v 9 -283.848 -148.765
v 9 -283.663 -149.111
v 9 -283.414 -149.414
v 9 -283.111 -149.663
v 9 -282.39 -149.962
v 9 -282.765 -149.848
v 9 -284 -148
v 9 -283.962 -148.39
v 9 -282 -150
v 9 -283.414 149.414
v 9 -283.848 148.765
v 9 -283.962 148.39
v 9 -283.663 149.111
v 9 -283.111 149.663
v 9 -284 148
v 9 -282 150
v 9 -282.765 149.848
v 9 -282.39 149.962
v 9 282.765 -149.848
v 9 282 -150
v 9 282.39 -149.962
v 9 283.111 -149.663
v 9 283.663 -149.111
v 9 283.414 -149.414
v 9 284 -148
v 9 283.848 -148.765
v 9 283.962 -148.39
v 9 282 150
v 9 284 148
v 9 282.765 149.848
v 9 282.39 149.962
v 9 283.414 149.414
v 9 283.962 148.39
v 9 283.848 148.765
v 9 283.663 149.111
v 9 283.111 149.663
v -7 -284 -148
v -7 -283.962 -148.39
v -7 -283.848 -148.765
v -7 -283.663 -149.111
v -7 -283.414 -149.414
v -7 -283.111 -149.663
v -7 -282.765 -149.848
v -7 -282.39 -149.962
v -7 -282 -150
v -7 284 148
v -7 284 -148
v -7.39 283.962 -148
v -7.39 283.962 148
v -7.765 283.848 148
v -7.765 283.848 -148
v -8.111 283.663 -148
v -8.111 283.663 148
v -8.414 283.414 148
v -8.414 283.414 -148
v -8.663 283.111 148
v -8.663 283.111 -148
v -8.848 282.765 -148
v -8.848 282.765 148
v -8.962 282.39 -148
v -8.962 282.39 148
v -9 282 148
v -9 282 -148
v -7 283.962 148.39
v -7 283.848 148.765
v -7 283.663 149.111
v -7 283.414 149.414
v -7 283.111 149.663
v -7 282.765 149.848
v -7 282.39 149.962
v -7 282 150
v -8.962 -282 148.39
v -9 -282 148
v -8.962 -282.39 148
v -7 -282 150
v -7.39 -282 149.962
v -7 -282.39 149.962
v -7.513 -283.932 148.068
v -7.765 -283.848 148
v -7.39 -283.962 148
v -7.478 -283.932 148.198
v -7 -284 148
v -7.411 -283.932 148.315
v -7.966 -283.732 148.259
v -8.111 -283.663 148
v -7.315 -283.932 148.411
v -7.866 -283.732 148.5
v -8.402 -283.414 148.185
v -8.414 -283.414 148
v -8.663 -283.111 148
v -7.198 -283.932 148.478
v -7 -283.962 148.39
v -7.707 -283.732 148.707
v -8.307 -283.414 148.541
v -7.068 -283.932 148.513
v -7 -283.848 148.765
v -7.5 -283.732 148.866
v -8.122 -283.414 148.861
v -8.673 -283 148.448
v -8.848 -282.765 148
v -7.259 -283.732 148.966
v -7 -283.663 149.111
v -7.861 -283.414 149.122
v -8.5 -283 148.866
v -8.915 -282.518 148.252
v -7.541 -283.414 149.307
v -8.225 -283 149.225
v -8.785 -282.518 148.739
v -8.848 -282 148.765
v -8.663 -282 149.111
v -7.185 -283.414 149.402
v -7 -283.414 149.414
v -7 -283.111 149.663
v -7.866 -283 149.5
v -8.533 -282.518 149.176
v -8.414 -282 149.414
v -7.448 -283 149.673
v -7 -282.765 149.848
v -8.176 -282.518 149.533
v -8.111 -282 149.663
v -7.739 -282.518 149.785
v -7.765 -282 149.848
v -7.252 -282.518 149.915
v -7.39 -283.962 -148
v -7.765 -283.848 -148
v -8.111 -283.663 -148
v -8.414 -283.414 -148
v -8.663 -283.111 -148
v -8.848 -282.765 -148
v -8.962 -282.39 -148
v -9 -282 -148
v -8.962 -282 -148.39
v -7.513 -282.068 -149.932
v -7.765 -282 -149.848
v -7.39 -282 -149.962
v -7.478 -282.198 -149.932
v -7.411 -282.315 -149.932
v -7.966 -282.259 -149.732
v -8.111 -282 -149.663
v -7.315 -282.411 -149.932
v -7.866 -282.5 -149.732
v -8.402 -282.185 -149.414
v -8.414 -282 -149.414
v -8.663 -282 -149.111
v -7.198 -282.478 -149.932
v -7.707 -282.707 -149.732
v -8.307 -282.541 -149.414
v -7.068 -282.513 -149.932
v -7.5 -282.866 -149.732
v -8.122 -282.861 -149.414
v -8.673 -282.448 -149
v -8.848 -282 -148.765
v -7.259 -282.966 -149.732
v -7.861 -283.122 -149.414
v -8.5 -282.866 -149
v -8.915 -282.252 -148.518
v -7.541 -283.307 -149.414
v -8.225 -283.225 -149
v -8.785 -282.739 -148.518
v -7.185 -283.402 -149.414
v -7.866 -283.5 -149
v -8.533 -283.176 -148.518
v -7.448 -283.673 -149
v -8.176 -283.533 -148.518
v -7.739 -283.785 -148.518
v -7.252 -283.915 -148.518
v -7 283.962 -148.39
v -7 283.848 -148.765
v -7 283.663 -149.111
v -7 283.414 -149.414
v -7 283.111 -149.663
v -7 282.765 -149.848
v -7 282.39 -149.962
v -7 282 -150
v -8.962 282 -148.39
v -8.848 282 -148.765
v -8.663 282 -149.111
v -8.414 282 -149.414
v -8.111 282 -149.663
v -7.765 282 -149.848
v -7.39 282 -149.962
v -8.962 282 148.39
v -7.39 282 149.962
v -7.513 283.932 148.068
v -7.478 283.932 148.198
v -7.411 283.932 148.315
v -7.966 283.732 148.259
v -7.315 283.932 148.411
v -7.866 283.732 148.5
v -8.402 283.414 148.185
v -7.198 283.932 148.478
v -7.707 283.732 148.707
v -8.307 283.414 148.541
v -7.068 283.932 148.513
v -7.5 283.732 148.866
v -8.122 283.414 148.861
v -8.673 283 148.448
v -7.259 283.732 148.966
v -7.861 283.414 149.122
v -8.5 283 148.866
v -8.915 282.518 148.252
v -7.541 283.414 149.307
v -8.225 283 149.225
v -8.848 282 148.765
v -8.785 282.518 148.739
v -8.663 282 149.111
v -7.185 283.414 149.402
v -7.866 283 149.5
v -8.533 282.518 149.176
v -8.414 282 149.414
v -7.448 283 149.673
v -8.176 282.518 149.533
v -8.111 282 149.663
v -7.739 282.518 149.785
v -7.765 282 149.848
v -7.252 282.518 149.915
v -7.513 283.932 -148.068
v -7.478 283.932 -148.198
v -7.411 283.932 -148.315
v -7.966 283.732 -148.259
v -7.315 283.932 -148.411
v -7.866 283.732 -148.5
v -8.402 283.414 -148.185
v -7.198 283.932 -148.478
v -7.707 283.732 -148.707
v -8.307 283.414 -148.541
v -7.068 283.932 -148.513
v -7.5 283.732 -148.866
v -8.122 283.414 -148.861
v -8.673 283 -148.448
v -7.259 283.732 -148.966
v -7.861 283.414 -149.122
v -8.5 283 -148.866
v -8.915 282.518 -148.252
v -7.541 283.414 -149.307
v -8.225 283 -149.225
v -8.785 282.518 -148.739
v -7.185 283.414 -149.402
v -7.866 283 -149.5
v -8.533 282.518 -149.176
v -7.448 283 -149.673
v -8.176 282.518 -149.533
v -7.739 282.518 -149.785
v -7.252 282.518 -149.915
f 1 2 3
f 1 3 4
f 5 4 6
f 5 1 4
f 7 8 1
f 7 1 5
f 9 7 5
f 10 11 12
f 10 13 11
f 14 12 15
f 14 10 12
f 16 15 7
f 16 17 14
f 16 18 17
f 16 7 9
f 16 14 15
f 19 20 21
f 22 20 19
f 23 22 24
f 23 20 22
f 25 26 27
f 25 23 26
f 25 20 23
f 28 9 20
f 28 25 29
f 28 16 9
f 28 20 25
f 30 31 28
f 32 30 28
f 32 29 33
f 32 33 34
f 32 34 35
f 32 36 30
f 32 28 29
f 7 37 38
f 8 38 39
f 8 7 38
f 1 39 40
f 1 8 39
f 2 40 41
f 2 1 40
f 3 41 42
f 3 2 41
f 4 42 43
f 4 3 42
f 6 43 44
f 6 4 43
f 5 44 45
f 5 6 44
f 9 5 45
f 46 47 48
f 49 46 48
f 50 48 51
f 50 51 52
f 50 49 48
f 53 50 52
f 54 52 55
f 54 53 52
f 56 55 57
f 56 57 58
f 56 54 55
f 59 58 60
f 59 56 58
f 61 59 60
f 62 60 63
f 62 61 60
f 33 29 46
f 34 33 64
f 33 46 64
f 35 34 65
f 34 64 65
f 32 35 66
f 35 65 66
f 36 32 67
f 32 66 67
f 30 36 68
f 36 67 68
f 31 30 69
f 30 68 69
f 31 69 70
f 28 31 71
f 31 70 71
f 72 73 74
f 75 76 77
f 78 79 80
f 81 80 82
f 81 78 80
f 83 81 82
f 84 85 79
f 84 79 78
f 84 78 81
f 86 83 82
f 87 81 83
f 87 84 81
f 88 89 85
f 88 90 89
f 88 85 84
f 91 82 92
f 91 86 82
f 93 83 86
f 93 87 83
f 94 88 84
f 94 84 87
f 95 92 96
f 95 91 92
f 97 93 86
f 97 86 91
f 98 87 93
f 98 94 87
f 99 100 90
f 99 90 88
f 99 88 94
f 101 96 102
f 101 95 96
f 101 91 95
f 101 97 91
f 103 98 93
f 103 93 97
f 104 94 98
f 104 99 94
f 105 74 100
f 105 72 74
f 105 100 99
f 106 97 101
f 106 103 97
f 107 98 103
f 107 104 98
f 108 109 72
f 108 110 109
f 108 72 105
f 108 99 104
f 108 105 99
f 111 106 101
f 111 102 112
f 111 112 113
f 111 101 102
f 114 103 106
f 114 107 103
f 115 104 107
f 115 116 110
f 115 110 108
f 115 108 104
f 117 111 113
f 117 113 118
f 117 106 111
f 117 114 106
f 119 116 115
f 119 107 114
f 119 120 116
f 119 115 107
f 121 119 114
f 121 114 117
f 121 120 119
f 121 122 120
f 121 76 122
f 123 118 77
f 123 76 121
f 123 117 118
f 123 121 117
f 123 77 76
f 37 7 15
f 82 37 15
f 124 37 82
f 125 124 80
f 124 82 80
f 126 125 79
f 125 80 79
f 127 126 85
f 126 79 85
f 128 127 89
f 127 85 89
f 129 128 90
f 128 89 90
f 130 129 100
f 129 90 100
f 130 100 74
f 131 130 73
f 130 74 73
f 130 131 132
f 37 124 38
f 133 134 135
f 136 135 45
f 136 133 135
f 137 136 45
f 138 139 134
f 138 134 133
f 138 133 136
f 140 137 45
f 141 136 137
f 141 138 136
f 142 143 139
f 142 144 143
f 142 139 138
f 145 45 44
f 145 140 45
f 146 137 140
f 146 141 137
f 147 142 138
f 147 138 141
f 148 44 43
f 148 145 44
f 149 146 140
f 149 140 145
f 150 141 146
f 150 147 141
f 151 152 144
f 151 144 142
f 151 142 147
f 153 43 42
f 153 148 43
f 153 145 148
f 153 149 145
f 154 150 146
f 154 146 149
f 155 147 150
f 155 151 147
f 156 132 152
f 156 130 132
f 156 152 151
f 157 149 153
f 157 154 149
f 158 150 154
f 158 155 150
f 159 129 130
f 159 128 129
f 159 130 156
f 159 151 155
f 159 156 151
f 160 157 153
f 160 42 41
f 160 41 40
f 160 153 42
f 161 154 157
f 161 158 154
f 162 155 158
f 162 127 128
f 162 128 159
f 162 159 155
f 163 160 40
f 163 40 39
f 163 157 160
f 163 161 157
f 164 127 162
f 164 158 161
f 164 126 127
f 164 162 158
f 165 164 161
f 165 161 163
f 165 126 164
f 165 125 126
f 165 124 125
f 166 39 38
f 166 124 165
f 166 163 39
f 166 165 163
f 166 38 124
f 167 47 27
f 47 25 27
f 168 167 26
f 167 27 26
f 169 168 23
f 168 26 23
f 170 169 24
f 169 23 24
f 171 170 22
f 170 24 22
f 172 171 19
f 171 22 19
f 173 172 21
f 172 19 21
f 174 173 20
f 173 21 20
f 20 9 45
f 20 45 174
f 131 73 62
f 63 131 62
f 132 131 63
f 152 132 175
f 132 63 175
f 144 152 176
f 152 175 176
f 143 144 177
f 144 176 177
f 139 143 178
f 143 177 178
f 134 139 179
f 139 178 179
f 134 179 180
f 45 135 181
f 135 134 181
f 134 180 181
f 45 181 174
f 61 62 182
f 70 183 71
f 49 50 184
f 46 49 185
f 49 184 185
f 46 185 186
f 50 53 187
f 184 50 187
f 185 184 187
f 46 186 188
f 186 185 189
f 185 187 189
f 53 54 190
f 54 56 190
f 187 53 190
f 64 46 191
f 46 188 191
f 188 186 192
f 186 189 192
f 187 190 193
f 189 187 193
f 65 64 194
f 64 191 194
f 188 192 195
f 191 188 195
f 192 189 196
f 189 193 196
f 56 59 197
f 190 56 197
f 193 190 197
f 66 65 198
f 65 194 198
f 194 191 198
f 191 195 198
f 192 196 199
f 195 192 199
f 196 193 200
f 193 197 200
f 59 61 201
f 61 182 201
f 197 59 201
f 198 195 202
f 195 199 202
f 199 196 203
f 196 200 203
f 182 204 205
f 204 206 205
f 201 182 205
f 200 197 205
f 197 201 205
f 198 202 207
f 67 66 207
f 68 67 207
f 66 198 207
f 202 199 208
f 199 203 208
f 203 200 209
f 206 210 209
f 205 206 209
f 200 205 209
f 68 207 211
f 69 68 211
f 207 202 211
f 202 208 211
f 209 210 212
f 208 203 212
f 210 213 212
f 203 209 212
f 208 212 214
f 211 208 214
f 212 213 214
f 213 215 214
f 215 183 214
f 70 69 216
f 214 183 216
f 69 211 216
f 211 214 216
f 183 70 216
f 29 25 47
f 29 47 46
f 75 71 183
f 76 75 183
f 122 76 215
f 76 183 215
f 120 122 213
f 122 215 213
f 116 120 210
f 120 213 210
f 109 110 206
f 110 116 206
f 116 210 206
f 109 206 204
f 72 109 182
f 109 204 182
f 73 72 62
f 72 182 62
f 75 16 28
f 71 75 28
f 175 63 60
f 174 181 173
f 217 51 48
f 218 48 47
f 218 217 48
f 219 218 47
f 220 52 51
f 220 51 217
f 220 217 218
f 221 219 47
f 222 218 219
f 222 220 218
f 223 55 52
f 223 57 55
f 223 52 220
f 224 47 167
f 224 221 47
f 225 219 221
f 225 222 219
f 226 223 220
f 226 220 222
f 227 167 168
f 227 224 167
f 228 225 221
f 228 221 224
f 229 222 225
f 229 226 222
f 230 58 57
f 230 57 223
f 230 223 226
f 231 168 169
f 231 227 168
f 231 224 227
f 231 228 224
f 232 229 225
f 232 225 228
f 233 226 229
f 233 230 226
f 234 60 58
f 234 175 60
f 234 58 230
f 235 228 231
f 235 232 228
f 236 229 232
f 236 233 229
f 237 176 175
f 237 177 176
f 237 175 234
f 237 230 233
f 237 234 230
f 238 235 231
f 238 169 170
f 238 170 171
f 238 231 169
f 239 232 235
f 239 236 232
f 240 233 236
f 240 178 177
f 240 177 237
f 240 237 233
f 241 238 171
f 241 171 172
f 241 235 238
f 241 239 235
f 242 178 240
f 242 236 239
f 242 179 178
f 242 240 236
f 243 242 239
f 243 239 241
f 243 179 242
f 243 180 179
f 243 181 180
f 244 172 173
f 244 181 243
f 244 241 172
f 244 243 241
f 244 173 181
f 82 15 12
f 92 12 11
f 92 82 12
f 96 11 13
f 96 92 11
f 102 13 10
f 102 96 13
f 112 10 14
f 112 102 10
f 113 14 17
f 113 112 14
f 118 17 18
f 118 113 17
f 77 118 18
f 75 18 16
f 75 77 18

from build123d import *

# Parameters (mm, degrees)
F0_W     = 568
F0_H     = 300
F1_DEPTH = 9
F2_R     = 2


with BuildPart() as f1:
    # F0 (on Right) → F1 (new body, symmetric)
    with BuildSketch(Plane.YZ):
        Rectangle(F0_W, F0_H)
    extrude(amount=F1_DEPTH, both=True)

    # F2
    f2_edges = [f1.edges().sort_by_distance(p)[0] for p in [
        (-9, 0, 150),
        (-9, -284, 0),
        (-9, 0, -150),
        (-9, 284, 0),
        (0, 284, 150),
        (0, 284, -150),
        (0, -284, 150),
        (0, -284, -150),
    ]]
    fillet(f2_edges, radius=F2_R)


solid = f1.part
